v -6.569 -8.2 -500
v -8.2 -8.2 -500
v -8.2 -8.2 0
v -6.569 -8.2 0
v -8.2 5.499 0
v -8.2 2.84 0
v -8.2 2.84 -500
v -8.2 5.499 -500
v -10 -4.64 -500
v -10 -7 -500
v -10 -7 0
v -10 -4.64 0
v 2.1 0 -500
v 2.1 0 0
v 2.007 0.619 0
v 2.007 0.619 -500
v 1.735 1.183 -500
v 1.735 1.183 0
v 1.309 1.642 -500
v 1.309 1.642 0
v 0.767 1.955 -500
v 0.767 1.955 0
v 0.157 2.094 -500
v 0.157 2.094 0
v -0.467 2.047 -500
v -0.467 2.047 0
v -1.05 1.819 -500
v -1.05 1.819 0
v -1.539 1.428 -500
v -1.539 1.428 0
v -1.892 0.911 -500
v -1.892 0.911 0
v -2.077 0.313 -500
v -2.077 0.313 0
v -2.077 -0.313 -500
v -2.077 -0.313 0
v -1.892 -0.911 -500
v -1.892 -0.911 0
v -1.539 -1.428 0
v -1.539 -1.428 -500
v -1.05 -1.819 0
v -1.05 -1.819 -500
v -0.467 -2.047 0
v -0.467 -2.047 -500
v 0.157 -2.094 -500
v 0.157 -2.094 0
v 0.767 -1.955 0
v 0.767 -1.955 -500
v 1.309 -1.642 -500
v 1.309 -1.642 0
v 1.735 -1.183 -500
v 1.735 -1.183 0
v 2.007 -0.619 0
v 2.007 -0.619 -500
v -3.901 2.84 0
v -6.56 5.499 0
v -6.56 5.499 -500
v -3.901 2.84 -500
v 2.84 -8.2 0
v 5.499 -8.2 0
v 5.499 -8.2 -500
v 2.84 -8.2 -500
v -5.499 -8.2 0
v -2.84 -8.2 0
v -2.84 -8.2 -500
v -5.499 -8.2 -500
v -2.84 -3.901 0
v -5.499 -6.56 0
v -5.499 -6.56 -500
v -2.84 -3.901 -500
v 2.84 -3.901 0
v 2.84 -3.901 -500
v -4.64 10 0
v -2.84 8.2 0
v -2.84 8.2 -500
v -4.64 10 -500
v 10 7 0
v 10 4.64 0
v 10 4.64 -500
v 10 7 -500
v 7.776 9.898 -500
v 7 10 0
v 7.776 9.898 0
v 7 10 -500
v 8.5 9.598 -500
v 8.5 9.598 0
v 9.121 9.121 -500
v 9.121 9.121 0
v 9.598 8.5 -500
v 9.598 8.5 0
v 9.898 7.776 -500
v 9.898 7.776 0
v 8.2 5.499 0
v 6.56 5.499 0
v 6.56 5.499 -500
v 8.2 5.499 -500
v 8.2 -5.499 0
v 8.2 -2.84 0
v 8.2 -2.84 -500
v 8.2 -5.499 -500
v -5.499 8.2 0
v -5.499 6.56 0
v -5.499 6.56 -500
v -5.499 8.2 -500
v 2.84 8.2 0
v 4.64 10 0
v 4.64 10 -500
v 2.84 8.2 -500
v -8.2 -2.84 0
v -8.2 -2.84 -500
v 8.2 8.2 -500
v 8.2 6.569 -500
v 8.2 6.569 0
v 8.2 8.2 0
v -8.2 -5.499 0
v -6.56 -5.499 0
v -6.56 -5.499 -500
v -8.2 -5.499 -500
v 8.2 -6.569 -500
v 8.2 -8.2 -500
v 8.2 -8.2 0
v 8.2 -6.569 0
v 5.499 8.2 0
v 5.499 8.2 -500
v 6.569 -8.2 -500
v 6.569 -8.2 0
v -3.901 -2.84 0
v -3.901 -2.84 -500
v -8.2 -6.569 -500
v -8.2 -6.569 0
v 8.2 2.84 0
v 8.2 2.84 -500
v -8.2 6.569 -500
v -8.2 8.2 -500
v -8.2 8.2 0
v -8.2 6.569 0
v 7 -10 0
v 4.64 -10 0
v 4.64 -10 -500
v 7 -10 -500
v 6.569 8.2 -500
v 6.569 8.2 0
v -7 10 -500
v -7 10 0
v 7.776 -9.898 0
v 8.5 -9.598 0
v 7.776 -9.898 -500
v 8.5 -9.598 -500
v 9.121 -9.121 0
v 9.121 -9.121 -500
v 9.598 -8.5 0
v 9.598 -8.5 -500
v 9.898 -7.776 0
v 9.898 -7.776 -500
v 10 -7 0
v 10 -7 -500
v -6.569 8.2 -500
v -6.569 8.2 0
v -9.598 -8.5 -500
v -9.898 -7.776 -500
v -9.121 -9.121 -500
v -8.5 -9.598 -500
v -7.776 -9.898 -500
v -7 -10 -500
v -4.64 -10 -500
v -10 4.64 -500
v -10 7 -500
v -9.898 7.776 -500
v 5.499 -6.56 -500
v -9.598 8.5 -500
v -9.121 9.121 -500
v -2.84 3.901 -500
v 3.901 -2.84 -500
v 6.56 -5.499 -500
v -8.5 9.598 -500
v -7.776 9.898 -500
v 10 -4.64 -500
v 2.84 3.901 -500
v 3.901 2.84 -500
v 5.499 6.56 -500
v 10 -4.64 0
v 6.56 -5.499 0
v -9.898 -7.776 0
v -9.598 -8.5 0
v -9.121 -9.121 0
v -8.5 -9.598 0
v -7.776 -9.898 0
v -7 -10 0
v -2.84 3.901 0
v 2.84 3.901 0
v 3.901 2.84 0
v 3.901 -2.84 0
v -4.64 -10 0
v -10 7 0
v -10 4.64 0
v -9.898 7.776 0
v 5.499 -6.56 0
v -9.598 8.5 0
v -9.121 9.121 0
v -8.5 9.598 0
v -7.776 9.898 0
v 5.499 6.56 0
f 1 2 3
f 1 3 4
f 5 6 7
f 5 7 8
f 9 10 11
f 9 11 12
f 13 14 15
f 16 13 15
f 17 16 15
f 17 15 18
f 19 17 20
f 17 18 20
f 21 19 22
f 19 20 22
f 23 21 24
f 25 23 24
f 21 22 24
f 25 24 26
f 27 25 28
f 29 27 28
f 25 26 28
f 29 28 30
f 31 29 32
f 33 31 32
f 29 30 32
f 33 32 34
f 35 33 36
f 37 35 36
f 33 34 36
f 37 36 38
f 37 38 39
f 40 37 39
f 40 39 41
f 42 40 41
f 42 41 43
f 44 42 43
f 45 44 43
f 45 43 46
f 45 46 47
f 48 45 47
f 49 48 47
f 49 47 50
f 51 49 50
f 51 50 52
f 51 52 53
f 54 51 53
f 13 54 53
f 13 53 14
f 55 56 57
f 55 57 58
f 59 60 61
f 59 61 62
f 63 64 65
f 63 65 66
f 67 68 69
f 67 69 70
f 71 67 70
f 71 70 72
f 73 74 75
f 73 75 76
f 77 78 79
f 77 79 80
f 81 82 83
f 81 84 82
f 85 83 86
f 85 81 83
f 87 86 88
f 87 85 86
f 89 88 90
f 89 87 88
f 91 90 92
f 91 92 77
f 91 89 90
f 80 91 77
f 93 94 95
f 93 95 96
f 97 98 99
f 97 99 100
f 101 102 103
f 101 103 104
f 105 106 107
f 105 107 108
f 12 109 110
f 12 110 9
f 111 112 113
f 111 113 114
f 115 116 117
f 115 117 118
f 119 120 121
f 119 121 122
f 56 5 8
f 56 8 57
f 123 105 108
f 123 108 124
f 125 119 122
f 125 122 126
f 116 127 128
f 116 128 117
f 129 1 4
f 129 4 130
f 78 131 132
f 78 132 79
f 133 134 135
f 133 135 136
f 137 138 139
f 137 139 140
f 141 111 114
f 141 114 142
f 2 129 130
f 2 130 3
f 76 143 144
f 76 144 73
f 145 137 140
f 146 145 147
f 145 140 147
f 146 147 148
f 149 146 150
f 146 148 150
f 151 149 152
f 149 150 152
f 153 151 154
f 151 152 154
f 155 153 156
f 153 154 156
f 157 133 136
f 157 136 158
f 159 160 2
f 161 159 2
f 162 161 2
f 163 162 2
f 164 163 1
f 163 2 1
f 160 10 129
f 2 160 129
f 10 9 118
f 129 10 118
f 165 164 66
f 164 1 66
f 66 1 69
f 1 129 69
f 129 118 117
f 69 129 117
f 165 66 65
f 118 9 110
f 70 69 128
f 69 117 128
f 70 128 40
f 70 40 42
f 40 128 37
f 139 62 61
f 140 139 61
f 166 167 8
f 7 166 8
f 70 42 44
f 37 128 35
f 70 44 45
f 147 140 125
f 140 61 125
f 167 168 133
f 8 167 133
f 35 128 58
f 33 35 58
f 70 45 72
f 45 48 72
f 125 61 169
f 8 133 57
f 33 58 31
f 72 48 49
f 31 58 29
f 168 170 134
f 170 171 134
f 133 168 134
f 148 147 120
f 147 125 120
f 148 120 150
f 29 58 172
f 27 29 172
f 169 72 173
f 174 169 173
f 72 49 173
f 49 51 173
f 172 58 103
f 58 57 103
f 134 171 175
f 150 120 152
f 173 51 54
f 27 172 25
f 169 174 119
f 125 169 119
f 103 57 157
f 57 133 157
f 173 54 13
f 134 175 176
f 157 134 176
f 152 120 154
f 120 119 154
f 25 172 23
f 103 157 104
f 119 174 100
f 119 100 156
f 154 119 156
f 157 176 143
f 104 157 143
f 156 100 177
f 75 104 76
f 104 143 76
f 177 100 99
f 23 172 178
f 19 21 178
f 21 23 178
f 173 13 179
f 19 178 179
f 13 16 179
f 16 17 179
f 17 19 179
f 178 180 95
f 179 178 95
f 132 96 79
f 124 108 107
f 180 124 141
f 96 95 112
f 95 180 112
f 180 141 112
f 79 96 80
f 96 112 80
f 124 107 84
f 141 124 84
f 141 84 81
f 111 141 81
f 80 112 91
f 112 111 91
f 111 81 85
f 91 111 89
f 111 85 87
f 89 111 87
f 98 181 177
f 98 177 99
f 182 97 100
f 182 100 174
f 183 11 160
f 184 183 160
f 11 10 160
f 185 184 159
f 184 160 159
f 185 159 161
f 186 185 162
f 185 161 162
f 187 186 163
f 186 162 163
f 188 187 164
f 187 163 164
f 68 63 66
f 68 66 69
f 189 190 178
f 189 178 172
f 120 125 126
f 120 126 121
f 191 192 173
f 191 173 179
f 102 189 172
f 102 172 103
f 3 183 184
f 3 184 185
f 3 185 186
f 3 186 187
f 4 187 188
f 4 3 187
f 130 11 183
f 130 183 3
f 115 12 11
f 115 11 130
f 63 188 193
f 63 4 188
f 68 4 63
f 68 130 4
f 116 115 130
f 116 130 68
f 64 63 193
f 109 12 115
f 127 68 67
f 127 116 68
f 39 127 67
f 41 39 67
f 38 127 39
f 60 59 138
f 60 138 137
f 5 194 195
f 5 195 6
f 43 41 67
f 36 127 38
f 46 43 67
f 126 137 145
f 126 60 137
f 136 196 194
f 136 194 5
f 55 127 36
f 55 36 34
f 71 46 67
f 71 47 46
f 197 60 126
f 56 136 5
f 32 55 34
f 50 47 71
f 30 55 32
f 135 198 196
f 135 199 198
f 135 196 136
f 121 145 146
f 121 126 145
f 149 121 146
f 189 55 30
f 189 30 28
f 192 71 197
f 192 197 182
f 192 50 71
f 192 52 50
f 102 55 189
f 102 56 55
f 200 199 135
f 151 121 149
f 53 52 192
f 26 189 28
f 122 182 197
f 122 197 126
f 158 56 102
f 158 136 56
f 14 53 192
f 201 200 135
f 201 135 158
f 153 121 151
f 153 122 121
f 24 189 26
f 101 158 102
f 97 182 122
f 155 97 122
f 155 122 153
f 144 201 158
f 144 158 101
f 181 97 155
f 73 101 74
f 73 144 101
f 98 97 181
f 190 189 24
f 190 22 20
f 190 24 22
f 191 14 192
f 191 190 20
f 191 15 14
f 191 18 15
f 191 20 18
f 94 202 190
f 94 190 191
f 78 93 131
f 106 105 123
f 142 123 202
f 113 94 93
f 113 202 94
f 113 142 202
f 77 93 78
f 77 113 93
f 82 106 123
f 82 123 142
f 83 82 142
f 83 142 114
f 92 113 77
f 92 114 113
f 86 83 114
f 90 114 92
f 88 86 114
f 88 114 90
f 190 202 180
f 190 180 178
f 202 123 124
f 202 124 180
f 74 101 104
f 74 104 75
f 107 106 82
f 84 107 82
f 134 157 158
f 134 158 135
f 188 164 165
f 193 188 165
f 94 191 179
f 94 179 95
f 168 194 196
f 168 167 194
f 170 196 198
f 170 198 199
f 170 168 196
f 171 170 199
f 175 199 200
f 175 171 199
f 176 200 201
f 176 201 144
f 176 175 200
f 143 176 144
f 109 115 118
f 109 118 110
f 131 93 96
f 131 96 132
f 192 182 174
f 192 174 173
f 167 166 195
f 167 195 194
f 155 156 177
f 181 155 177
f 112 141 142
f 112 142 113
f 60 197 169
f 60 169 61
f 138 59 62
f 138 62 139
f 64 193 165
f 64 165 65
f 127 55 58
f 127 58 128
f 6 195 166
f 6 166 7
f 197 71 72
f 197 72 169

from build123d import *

# Parameters (mm, degrees)
SKETCH1_W           = 20
SKETCH1_H           = 20
BOSS_EXTRUDE1_DEPTH = 500
CUT_EXTRUDE2_REACH  = 502.2
CIRPATTERN1_COUNT   = 4
CUT_EXTRUDE3_REACH  = 502.2
SKETCH3_R           = 2.1
CUT_EXTRUDE4_REACH  = 502.2
CIRPATTERN2_COUNT   = 4
FILLET1_R           = 3


with BuildPart() as part:
    # Sketch1 → Boss-Extrude1 (new body)
    with BuildSketch(Plane.XY):
        Rectangle(SKETCH1_W, SKETCH1_H)
    extrude(amount=-BOSS_EXTRUDE1_DEPTH)

    # Sketch2 → Cut-Extrude2 (cut, up to next)
    with BuildSketch(Plane.XY, mode=Mode.PRIVATE) as cut_extrude2_sk1:
        Polygon((-5.499339828, -6.56), (-2.84, -3.900660172), (2.84, -3.900660172), (5.499339828, -6.56), (5.499339828, -8.2), (2.84, -8.2), (4.64, -10), (-4.64, -10), (-2.84, -8.2), (-5.499339828, -8.2), align=None)
    cut_extrude2_tool1 = extrude(cut_extrude2_sk1.sketch, amount=-CUT_EXTRUDE2_REACH, mode=Mode.PRIVATE) & part.part
    cut_extrude2 = cut_extrude2_tool1.solids().sort_by_distance((0, -6.999797, 0))[0]
    add(cut_extrude2, mode=Mode.SUBTRACT)

    # CirPattern1: Cut-Extrude2 ×4 about axis
    cirpattern1_axis = Axis((0, 0, -525), (0, 0, 1))
    for i in range(1, CIRPATTERN1_COUNT):
        add(cut_extrude2.rotate(cirpattern1_axis, i * 360 / CIRPATTERN1_COUNT), mode=Mode.SUBTRACT)

    # Sketch3 → Cut-Extrude3 (cut, up to next)
    with BuildSketch(Plane.XY, mode=Mode.PRIVATE) as cut_extrude3_sk1:
        Circle(SKETCH3_R)
    cut_extrude3_tool1 = extrude(cut_extrude3_sk1.sketch, amount=-CUT_EXTRUDE3_REACH, mode=Mode.PRIVATE) & part.part
    add(cut_extrude3_tool1.solids().sort_by_distance((0, 0, 0))[0], mode=Mode.SUBTRACT)

    # Sketch4 → Cut-Extrude4 (cut, up to next)
    with BuildSketch(Plane.XY, mode=Mode.PRIVATE) as cut_extrude4_sk1:
        Polygon((-8.2, 8.2), (-8.2, 6.569339828), (-6.569339828, 8.2), align=None)
    cut_extrude4_tool1 = extrude(cut_extrude4_sk1.sketch, amount=-CUT_EXTRUDE4_REACH, mode=Mode.PRIVATE) & part.part
    cut_extrude4 = cut_extrude4_tool1.solids().sort_by_distance((-7.656447, 7.656447, 0))[0]
    add(cut_extrude4, mode=Mode.SUBTRACT)

    # CirPattern2: Cut-Extrude4 ×4 about axis
    cirpattern2_axis = Axis((0, 0, -525), (0, 0, 1))
    for i in range(1, CIRPATTERN2_COUNT):
        add(cut_extrude4.rotate(cirpattern2_axis, i * 360 / CIRPATTERN2_COUNT), mode=Mode.SUBTRACT)

    # Fillet1
    fillet1_edges = [part.edges().sort_by_distance(p)[0] for p in [
        (-10, -10, -250),
        (-10, 10, -250),
        (10, 10, -250),
        (10, -10, -250),
    ]]
    fillet(fillet1_edges, radius=FILLET1_R)


solid = part.part
